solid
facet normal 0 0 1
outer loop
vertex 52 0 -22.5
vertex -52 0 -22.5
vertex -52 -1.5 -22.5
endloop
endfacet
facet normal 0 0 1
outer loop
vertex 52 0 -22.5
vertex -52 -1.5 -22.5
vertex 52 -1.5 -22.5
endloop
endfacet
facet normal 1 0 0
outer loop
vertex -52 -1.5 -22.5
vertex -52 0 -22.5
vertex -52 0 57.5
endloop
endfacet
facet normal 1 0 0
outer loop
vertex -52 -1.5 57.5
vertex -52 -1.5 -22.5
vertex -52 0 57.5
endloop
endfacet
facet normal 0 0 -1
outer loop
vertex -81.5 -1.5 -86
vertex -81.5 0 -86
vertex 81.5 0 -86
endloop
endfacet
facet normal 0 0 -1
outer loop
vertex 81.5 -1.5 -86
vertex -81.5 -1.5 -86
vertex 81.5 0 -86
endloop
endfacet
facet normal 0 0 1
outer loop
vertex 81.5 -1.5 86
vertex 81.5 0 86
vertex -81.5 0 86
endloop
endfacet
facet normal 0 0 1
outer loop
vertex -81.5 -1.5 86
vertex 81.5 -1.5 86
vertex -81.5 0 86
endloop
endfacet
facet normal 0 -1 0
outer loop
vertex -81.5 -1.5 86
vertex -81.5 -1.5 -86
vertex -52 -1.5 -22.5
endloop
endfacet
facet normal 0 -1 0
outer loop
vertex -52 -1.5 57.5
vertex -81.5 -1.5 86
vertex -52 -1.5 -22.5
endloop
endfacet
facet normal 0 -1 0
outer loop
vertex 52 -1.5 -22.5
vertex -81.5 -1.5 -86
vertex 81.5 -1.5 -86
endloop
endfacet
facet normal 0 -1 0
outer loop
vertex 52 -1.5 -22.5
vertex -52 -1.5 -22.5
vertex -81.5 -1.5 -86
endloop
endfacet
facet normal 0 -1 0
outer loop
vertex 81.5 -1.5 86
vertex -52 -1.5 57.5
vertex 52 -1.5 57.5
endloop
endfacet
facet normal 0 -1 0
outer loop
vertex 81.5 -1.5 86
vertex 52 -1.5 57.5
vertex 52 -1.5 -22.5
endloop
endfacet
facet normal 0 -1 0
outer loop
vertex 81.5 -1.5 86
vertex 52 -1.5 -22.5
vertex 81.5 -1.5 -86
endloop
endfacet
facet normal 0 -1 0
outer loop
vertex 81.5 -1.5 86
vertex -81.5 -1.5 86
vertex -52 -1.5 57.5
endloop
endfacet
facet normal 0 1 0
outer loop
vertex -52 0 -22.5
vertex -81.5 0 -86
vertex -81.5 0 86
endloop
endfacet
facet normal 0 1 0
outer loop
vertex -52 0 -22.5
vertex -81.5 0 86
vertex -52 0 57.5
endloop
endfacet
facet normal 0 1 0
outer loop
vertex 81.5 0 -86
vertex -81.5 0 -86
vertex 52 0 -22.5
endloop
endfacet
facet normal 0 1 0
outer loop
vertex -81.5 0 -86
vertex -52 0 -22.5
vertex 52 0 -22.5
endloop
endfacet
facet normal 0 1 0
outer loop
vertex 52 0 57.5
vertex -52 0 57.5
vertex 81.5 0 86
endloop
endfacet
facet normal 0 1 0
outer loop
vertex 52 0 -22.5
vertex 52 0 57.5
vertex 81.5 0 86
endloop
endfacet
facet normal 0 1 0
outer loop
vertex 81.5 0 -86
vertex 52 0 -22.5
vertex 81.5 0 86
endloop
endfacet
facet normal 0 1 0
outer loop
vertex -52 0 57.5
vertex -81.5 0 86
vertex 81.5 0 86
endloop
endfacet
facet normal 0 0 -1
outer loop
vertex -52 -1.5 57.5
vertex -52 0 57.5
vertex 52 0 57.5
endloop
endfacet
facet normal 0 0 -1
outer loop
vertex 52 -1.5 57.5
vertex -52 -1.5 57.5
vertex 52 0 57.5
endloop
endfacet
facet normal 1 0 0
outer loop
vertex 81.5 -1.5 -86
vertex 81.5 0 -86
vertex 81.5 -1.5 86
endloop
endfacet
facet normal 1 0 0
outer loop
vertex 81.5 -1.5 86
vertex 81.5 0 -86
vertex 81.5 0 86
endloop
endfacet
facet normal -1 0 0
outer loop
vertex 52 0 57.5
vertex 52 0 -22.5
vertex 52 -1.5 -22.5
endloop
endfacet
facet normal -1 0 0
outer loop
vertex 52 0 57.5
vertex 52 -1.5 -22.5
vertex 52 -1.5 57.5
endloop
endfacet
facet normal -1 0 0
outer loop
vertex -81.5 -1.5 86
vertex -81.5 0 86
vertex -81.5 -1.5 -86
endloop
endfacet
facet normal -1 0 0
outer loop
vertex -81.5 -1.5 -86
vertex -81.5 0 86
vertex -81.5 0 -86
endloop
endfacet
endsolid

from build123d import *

# Parameters (mm, degrees)
F0_W     = 104
F0_H     = 80
F1_DEPTH = 1.5


with BuildPart() as f1:
    # F0 (on Front) → F1 (new body)
    with BuildSketch(Plane.XZ):
        Polygon((81.5, -86), (81.5, 86), (-81.5, 86), (-81.5, -86), (-3, -86), (3, -86), align=None)
        with Locations((0, 17.5)):
            Rectangle(F0_W, F0_H, mode=Mode.SUBTRACT)
    extrude(amount=F1_DEPTH)


solid = f1.part
